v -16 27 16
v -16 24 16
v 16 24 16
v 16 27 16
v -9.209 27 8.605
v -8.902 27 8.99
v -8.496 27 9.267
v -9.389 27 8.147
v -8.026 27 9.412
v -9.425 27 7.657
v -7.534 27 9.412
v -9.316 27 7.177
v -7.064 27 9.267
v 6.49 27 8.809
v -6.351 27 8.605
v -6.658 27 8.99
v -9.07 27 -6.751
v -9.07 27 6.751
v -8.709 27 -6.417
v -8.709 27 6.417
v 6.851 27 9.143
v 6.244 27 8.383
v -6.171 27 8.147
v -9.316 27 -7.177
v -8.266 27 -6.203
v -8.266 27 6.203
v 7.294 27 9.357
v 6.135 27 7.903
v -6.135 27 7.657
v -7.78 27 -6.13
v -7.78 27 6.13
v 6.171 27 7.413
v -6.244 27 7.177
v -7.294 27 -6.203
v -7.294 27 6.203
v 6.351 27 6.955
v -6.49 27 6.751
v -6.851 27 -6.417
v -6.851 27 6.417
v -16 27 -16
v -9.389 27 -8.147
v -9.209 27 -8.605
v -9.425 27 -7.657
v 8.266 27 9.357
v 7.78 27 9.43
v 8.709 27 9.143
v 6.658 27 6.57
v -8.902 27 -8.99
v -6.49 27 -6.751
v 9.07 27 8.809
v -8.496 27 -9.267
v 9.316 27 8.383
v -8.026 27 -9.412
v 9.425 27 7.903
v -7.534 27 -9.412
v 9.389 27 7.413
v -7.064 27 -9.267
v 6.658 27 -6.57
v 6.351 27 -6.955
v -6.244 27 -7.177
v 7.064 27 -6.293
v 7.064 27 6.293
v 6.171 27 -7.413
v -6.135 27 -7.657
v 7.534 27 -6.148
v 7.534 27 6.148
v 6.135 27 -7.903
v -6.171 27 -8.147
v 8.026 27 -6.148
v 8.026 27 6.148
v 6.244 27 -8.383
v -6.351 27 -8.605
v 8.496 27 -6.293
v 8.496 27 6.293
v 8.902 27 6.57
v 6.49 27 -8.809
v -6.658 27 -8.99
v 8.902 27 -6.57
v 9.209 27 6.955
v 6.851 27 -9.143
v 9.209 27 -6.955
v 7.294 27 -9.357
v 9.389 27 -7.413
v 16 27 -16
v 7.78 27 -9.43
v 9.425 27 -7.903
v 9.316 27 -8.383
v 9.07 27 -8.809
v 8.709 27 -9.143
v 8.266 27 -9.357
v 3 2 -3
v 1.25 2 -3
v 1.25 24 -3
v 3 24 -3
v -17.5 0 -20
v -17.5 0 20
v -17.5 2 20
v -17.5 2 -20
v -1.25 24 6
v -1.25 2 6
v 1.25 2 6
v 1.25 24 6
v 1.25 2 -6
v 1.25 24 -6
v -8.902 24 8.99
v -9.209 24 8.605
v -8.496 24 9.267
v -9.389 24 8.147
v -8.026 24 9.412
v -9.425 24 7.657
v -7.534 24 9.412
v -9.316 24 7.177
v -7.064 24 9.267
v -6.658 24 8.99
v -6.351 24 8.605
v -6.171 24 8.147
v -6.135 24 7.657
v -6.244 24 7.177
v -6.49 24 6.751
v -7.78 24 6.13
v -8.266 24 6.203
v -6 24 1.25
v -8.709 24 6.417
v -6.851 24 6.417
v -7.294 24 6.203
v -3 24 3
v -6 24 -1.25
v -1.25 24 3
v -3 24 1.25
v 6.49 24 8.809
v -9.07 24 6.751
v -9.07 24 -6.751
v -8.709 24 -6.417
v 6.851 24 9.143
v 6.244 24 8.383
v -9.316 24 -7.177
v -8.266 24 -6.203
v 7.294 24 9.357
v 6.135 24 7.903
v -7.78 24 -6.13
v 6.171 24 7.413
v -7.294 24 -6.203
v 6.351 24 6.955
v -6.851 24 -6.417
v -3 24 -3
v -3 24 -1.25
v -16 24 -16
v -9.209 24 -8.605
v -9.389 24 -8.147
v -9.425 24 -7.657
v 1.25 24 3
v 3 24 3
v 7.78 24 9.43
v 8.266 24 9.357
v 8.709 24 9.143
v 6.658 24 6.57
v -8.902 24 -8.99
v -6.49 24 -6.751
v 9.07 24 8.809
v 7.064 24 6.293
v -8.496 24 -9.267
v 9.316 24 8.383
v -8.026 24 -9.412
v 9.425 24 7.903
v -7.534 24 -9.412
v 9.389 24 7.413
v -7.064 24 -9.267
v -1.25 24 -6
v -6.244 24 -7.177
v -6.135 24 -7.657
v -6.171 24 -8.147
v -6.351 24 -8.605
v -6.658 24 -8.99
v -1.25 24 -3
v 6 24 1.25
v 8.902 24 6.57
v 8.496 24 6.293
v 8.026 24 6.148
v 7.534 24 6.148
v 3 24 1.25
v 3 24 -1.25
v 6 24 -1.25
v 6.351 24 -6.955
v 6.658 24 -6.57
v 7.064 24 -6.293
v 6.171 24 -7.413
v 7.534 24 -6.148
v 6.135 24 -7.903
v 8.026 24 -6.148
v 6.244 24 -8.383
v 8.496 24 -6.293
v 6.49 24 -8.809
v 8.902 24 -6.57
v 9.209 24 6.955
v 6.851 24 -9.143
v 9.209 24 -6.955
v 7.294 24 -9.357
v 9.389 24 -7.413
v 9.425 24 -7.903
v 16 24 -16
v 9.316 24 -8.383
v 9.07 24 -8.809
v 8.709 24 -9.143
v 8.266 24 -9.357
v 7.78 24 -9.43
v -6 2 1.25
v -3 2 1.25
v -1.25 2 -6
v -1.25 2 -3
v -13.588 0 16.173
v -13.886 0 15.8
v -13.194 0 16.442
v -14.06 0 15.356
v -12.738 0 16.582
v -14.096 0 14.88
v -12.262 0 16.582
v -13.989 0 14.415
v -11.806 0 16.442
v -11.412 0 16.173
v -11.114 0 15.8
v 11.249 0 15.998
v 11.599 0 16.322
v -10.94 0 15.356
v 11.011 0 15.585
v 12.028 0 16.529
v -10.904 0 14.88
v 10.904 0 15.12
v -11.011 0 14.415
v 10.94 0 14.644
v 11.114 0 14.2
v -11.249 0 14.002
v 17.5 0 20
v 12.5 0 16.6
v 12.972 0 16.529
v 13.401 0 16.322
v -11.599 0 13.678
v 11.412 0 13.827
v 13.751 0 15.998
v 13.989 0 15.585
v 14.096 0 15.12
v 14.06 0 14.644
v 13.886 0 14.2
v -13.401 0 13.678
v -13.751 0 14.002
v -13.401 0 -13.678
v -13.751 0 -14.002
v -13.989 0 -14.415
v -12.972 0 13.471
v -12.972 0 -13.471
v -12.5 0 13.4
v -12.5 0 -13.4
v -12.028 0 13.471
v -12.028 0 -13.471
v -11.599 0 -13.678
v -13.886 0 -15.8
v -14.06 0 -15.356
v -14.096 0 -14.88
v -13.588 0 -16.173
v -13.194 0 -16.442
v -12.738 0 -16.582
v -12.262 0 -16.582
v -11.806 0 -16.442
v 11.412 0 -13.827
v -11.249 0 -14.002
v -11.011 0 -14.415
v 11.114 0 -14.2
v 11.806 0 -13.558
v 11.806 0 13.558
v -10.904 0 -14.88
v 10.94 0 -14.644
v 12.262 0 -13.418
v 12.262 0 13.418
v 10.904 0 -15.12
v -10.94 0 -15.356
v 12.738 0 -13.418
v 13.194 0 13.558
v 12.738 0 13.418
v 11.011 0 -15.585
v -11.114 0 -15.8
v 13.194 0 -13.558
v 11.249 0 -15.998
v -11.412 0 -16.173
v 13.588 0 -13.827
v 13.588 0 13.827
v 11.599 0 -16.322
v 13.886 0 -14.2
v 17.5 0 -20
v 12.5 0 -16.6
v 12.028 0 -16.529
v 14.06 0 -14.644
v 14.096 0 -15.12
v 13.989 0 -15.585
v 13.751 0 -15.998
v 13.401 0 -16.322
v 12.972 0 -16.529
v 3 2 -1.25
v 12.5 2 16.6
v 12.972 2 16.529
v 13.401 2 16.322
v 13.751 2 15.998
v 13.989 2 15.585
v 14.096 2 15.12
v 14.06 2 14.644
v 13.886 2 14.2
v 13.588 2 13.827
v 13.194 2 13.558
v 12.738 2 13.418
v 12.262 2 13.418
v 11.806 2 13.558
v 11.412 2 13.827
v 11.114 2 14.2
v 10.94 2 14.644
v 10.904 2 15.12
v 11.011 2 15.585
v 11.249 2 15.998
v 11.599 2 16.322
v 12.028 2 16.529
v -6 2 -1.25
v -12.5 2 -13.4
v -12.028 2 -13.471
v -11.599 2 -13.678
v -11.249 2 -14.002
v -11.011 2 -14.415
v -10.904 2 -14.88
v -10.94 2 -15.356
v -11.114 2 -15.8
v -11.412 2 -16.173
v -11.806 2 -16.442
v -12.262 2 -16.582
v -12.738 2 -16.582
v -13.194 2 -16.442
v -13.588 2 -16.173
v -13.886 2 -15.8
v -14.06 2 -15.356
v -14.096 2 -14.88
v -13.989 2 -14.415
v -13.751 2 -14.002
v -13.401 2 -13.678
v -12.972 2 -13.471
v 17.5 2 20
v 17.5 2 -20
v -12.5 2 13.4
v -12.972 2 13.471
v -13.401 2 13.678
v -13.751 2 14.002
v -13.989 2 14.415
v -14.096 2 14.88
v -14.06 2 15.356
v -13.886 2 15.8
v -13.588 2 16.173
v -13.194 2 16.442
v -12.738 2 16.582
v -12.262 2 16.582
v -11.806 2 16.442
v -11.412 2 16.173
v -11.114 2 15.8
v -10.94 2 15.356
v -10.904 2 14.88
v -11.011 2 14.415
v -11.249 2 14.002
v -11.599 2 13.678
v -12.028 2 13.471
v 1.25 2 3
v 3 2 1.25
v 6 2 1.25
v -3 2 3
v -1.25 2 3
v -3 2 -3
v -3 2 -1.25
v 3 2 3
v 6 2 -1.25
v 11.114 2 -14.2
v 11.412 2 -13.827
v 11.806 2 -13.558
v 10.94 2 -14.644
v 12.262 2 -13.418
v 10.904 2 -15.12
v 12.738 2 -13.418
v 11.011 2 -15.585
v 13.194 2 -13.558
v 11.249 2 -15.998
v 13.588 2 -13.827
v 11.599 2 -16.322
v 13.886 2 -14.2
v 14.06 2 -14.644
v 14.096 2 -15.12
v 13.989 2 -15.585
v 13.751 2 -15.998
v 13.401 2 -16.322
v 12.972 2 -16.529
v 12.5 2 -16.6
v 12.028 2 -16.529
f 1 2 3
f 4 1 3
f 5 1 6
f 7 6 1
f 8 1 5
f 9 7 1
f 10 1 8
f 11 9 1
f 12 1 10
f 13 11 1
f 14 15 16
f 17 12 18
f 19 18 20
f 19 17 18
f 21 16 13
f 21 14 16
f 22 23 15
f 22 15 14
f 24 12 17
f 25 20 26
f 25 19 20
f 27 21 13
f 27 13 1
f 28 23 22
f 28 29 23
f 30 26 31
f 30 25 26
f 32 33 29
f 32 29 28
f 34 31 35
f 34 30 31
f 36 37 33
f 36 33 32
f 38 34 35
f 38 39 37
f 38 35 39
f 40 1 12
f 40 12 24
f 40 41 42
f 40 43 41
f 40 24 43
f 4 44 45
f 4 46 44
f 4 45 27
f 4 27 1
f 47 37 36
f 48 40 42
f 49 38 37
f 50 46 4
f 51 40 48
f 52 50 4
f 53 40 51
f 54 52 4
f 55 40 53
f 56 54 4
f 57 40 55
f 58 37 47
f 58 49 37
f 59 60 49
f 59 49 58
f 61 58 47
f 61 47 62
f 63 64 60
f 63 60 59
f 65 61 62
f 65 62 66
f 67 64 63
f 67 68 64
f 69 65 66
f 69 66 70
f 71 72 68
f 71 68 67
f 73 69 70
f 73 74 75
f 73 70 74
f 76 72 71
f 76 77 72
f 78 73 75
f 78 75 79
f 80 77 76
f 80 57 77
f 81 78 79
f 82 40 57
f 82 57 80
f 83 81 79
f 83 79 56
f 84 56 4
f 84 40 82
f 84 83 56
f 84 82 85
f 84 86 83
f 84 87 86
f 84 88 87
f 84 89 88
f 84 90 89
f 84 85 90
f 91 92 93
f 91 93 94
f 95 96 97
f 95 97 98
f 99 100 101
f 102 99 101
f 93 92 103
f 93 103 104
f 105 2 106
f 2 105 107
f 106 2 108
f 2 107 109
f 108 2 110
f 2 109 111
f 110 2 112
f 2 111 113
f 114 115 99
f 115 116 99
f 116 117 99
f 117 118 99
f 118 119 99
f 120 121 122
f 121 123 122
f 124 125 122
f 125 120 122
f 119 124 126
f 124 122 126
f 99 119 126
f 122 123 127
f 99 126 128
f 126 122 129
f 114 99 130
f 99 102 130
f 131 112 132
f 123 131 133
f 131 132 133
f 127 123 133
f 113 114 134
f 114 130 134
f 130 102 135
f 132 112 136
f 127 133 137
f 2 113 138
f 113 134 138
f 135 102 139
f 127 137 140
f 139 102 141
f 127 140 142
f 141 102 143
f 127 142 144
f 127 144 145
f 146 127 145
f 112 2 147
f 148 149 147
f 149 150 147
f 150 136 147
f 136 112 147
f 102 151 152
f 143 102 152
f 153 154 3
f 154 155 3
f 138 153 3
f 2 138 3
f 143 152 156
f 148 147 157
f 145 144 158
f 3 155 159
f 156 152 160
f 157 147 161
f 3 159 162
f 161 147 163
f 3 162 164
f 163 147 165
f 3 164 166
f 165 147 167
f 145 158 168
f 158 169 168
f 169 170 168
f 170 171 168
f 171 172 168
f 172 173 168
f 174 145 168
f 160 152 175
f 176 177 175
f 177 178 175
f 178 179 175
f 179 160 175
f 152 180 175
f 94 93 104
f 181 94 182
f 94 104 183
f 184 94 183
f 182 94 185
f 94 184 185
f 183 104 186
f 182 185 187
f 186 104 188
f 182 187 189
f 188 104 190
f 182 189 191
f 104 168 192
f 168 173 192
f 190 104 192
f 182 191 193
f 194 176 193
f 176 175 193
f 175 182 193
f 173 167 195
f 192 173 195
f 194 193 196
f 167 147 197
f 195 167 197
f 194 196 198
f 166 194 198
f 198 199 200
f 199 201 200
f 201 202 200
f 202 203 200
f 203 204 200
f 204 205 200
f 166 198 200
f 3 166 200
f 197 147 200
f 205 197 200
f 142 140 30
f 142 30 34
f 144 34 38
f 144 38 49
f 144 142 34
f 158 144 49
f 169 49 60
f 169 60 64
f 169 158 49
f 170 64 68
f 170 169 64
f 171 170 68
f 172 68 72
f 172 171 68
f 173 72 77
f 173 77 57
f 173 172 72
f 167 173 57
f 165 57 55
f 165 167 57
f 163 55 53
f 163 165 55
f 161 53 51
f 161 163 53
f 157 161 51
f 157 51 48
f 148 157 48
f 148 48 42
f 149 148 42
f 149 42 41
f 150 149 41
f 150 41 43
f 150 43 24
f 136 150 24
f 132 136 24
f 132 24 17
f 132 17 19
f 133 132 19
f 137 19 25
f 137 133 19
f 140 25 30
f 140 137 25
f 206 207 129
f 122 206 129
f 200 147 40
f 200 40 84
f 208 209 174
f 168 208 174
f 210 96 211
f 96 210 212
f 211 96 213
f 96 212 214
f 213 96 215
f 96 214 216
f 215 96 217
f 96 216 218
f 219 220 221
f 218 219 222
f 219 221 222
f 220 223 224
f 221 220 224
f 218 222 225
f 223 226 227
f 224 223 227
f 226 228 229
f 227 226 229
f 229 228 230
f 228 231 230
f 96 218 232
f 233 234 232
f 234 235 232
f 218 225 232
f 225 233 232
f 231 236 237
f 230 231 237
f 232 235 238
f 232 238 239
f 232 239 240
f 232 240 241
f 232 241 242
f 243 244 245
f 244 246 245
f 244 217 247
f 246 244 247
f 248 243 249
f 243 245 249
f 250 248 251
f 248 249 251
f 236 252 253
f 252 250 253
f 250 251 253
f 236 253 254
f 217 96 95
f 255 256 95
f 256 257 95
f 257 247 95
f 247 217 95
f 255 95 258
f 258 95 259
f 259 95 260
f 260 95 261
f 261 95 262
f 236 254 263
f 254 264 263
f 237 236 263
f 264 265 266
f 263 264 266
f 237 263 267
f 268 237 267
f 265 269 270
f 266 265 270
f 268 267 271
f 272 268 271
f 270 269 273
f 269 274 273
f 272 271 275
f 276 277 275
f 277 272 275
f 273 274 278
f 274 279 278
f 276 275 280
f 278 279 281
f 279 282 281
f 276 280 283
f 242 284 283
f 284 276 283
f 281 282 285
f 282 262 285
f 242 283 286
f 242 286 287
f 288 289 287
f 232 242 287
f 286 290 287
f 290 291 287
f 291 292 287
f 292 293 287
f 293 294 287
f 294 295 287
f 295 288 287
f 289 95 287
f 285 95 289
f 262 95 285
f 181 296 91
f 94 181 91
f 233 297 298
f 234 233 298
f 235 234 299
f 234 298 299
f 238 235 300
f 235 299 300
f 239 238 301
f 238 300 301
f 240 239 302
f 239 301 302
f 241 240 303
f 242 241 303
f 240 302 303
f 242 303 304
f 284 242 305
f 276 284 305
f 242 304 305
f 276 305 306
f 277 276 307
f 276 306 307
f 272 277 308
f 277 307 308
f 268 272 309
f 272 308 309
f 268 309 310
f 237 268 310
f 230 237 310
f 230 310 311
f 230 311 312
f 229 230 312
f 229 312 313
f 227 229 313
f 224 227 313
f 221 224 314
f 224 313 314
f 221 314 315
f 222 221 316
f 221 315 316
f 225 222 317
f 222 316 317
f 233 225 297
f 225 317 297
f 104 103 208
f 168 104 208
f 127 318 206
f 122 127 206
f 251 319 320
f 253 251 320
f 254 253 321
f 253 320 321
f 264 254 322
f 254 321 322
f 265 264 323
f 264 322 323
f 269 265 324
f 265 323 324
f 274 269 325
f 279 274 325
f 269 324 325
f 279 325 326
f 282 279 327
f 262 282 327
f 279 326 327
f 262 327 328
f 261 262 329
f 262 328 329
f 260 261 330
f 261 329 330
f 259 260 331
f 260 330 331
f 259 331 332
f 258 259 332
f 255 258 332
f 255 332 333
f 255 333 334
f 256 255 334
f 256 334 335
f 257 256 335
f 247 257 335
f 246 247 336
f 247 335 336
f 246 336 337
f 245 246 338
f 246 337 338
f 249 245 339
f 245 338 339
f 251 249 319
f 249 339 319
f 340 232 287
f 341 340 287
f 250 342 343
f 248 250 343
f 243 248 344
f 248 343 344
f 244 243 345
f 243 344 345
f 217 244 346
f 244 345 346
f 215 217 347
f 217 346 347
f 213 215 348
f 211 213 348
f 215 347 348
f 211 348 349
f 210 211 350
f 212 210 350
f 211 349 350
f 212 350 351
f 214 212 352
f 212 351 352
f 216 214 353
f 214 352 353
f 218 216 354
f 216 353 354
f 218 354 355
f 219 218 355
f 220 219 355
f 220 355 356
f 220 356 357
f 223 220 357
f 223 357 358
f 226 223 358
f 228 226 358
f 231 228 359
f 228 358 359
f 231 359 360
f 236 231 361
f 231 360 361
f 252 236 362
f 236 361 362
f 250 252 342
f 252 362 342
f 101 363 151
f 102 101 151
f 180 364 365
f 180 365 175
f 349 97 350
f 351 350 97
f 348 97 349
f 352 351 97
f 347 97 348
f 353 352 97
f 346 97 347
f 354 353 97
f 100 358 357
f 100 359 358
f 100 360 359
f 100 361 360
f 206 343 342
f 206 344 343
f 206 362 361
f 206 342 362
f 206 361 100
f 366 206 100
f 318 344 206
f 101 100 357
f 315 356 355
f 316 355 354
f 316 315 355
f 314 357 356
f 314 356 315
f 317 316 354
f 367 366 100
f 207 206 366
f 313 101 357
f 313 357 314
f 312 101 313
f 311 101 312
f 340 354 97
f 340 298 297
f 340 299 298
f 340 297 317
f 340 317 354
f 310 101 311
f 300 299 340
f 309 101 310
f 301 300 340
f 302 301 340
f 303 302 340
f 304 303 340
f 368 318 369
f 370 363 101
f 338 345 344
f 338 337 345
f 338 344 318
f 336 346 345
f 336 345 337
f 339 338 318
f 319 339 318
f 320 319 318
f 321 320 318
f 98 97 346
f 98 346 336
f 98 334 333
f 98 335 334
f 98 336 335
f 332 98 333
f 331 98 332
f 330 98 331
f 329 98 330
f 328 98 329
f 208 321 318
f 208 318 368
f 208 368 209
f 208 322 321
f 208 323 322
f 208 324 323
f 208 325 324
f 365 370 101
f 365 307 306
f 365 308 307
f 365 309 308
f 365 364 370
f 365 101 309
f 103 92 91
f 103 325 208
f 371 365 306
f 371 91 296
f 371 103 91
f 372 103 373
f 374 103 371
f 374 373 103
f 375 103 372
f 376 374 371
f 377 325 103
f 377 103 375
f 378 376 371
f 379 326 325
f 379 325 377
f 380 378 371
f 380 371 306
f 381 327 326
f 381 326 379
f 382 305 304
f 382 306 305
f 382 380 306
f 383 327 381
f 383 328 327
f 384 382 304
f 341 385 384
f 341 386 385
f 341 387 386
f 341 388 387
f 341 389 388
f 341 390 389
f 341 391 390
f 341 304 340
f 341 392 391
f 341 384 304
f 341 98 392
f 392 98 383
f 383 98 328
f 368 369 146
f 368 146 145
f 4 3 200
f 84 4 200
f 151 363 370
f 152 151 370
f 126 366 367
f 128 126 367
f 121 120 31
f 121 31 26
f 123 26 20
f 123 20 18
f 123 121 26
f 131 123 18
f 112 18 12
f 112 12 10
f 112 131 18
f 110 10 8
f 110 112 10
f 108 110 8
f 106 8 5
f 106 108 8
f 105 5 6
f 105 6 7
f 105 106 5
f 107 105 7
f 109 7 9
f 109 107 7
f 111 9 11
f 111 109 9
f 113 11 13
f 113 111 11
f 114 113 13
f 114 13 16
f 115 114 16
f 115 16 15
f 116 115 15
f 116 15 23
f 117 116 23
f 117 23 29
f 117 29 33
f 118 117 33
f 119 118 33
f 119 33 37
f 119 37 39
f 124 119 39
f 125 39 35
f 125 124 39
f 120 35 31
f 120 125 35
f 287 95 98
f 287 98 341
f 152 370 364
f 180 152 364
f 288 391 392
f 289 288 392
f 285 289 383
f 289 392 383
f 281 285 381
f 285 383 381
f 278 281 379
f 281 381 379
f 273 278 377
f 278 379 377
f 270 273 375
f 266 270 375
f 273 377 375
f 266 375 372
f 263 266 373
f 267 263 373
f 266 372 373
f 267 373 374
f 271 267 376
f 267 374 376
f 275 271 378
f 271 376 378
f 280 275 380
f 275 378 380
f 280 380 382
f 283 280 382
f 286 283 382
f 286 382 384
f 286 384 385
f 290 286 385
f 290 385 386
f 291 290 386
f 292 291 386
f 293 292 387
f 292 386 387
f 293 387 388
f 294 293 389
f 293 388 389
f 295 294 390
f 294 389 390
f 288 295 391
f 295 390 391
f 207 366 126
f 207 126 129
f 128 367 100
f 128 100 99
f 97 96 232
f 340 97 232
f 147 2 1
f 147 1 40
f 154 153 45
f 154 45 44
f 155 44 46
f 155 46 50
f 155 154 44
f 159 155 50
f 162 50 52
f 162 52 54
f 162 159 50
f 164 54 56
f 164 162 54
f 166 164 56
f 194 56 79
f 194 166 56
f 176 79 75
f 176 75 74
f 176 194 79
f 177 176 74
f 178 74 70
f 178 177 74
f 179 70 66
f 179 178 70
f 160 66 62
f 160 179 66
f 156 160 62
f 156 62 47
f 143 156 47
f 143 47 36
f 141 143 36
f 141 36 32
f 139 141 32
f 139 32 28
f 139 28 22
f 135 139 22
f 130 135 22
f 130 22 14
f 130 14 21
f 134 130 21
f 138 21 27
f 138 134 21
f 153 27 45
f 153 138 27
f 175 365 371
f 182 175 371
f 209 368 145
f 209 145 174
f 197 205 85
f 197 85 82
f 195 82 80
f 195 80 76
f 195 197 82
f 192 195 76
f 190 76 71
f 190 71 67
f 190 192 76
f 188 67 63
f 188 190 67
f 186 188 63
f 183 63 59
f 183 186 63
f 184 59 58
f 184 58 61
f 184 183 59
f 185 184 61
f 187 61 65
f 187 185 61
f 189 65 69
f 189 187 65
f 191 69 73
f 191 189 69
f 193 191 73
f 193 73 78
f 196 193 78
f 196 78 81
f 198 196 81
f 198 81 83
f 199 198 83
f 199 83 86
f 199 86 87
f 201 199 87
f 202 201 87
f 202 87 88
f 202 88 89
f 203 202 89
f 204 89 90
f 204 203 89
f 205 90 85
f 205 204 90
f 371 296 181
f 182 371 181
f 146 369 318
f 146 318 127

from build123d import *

# Parameters (mm, degrees)
SKETCH_1_W               = 35
SKETCH_1_H               = 40
EXTRUDE_1_DEPTH          = 2
SKETCH_2_R               = 1.6
CUT_EXTRUDE_1_DEPTH      = 2
SKETCH_3_W               = 6
SKETCH_3_H               = 6
EXTRUDE_2_DEPTH          = 22
SKETCH_4_W               = 32
SKETCH_4_H               = 32
SKETCH_4_R               = 1.65
EXTRUDE_3_DEPTH          = 3
SKETCH_5_W               = 2.5
SKETCH_5_H               = 22
EXTRUDE_4_DEPTH          = 3
PATTERN_CIRCULAR_1_COUNT = 4


with BuildPart() as part:
    # 草图1 → 凸台-拉伸1 (new body)
    with BuildSketch(Plane(origin=(0, 0, 0), x_dir=(1, 0, 0), z_dir=(0, 1, 0))):
        Rectangle(SKETCH_1_W, SKETCH_1_H)
    extrude(amount=EXTRUDE_1_DEPTH)

    # 草图2 → 切除-拉伸1 (cut)
    with BuildSketch(Plane(origin=(0, 2, 0), x_dir=(1, 0, 0), z_dir=(0, 1, 0))):
        with Locations(Location((-12.5, 15, 0), (0, 0, 270))):
            Circle(SKETCH_2_R)
        with Locations(Location((12.5, 15, 0), (0, 0, 90))):
            Circle(SKETCH_2_R)
        with Locations(Location((12.5, -15, 0), (0, 0, 270))):
            Circle(SKETCH_2_R)
        with Locations(Location((-12.5, -15, 0), (0, 0, 90))):
            Circle(SKETCH_2_R)
    extrude(amount=-CUT_EXTRUDE_1_DEPTH, mode=Mode.SUBTRACT)

    # 草图3 → 凸台-拉伸2 (add)
    with BuildSketch(Plane(origin=(0, 2, 0), x_dir=(1, 0, 0), z_dir=(0, 1, 0))):
        Rectangle(SKETCH_3_W, SKETCH_3_H)
    extrude(amount=EXTRUDE_2_DEPTH)

    # 草图4 → 凸台-拉伸3 (add)
    with BuildSketch(Plane(origin=(0, 24, 0), x_dir=(1, 0, 0), z_dir=(0, 1, 0))):
        Rectangle(SKETCH_4_W, SKETCH_4_H)
        with Locations(Location((-7.78, 7.78, 0), (0, 0, 270))):
            Circle(SKETCH_4_R, mode=Mode.SUBTRACT)
        with Locations(Location((7.78, 7.78, 0), (0, 0, 90))):
            Circle(SKETCH_4_R, mode=Mode.SUBTRACT)
        with Locations(Location((7.78, -7.78, 0), (0, 0, 270))):
            Circle(SKETCH_4_R, mode=Mode.SUBTRACT)
        with Locations(Location((-7.78, -7.78, 0), (0, 0, 90))):
            Circle(SKETCH_4_R, mode=Mode.SUBTRACT)
    extrude(amount=EXTRUDE_3_DEPTH)

    # 草图5 → 凸台-拉伸4 (add)
    with BuildSketch(Plane.XY.offset(3)):
        with Locations((0, 13)):
            Rectangle(SKETCH_5_W, SKETCH_5_H)
    extrude_4 = extrude(amount=EXTRUDE_4_DEPTH)

    # 阵列(圆周)1: 凸台-拉伸4 ×4 about axis
    pattern_circular_1_axis = Axis((0, 0, 0), (0, 1, 0))
    for i in range(1, PATTERN_CIRCULAR_1_COUNT):
        add(extrude_4.rotate(pattern_circular_1_axis, i * 360 / PATTERN_CIRCULAR_1_COUNT))


solid = part.part
